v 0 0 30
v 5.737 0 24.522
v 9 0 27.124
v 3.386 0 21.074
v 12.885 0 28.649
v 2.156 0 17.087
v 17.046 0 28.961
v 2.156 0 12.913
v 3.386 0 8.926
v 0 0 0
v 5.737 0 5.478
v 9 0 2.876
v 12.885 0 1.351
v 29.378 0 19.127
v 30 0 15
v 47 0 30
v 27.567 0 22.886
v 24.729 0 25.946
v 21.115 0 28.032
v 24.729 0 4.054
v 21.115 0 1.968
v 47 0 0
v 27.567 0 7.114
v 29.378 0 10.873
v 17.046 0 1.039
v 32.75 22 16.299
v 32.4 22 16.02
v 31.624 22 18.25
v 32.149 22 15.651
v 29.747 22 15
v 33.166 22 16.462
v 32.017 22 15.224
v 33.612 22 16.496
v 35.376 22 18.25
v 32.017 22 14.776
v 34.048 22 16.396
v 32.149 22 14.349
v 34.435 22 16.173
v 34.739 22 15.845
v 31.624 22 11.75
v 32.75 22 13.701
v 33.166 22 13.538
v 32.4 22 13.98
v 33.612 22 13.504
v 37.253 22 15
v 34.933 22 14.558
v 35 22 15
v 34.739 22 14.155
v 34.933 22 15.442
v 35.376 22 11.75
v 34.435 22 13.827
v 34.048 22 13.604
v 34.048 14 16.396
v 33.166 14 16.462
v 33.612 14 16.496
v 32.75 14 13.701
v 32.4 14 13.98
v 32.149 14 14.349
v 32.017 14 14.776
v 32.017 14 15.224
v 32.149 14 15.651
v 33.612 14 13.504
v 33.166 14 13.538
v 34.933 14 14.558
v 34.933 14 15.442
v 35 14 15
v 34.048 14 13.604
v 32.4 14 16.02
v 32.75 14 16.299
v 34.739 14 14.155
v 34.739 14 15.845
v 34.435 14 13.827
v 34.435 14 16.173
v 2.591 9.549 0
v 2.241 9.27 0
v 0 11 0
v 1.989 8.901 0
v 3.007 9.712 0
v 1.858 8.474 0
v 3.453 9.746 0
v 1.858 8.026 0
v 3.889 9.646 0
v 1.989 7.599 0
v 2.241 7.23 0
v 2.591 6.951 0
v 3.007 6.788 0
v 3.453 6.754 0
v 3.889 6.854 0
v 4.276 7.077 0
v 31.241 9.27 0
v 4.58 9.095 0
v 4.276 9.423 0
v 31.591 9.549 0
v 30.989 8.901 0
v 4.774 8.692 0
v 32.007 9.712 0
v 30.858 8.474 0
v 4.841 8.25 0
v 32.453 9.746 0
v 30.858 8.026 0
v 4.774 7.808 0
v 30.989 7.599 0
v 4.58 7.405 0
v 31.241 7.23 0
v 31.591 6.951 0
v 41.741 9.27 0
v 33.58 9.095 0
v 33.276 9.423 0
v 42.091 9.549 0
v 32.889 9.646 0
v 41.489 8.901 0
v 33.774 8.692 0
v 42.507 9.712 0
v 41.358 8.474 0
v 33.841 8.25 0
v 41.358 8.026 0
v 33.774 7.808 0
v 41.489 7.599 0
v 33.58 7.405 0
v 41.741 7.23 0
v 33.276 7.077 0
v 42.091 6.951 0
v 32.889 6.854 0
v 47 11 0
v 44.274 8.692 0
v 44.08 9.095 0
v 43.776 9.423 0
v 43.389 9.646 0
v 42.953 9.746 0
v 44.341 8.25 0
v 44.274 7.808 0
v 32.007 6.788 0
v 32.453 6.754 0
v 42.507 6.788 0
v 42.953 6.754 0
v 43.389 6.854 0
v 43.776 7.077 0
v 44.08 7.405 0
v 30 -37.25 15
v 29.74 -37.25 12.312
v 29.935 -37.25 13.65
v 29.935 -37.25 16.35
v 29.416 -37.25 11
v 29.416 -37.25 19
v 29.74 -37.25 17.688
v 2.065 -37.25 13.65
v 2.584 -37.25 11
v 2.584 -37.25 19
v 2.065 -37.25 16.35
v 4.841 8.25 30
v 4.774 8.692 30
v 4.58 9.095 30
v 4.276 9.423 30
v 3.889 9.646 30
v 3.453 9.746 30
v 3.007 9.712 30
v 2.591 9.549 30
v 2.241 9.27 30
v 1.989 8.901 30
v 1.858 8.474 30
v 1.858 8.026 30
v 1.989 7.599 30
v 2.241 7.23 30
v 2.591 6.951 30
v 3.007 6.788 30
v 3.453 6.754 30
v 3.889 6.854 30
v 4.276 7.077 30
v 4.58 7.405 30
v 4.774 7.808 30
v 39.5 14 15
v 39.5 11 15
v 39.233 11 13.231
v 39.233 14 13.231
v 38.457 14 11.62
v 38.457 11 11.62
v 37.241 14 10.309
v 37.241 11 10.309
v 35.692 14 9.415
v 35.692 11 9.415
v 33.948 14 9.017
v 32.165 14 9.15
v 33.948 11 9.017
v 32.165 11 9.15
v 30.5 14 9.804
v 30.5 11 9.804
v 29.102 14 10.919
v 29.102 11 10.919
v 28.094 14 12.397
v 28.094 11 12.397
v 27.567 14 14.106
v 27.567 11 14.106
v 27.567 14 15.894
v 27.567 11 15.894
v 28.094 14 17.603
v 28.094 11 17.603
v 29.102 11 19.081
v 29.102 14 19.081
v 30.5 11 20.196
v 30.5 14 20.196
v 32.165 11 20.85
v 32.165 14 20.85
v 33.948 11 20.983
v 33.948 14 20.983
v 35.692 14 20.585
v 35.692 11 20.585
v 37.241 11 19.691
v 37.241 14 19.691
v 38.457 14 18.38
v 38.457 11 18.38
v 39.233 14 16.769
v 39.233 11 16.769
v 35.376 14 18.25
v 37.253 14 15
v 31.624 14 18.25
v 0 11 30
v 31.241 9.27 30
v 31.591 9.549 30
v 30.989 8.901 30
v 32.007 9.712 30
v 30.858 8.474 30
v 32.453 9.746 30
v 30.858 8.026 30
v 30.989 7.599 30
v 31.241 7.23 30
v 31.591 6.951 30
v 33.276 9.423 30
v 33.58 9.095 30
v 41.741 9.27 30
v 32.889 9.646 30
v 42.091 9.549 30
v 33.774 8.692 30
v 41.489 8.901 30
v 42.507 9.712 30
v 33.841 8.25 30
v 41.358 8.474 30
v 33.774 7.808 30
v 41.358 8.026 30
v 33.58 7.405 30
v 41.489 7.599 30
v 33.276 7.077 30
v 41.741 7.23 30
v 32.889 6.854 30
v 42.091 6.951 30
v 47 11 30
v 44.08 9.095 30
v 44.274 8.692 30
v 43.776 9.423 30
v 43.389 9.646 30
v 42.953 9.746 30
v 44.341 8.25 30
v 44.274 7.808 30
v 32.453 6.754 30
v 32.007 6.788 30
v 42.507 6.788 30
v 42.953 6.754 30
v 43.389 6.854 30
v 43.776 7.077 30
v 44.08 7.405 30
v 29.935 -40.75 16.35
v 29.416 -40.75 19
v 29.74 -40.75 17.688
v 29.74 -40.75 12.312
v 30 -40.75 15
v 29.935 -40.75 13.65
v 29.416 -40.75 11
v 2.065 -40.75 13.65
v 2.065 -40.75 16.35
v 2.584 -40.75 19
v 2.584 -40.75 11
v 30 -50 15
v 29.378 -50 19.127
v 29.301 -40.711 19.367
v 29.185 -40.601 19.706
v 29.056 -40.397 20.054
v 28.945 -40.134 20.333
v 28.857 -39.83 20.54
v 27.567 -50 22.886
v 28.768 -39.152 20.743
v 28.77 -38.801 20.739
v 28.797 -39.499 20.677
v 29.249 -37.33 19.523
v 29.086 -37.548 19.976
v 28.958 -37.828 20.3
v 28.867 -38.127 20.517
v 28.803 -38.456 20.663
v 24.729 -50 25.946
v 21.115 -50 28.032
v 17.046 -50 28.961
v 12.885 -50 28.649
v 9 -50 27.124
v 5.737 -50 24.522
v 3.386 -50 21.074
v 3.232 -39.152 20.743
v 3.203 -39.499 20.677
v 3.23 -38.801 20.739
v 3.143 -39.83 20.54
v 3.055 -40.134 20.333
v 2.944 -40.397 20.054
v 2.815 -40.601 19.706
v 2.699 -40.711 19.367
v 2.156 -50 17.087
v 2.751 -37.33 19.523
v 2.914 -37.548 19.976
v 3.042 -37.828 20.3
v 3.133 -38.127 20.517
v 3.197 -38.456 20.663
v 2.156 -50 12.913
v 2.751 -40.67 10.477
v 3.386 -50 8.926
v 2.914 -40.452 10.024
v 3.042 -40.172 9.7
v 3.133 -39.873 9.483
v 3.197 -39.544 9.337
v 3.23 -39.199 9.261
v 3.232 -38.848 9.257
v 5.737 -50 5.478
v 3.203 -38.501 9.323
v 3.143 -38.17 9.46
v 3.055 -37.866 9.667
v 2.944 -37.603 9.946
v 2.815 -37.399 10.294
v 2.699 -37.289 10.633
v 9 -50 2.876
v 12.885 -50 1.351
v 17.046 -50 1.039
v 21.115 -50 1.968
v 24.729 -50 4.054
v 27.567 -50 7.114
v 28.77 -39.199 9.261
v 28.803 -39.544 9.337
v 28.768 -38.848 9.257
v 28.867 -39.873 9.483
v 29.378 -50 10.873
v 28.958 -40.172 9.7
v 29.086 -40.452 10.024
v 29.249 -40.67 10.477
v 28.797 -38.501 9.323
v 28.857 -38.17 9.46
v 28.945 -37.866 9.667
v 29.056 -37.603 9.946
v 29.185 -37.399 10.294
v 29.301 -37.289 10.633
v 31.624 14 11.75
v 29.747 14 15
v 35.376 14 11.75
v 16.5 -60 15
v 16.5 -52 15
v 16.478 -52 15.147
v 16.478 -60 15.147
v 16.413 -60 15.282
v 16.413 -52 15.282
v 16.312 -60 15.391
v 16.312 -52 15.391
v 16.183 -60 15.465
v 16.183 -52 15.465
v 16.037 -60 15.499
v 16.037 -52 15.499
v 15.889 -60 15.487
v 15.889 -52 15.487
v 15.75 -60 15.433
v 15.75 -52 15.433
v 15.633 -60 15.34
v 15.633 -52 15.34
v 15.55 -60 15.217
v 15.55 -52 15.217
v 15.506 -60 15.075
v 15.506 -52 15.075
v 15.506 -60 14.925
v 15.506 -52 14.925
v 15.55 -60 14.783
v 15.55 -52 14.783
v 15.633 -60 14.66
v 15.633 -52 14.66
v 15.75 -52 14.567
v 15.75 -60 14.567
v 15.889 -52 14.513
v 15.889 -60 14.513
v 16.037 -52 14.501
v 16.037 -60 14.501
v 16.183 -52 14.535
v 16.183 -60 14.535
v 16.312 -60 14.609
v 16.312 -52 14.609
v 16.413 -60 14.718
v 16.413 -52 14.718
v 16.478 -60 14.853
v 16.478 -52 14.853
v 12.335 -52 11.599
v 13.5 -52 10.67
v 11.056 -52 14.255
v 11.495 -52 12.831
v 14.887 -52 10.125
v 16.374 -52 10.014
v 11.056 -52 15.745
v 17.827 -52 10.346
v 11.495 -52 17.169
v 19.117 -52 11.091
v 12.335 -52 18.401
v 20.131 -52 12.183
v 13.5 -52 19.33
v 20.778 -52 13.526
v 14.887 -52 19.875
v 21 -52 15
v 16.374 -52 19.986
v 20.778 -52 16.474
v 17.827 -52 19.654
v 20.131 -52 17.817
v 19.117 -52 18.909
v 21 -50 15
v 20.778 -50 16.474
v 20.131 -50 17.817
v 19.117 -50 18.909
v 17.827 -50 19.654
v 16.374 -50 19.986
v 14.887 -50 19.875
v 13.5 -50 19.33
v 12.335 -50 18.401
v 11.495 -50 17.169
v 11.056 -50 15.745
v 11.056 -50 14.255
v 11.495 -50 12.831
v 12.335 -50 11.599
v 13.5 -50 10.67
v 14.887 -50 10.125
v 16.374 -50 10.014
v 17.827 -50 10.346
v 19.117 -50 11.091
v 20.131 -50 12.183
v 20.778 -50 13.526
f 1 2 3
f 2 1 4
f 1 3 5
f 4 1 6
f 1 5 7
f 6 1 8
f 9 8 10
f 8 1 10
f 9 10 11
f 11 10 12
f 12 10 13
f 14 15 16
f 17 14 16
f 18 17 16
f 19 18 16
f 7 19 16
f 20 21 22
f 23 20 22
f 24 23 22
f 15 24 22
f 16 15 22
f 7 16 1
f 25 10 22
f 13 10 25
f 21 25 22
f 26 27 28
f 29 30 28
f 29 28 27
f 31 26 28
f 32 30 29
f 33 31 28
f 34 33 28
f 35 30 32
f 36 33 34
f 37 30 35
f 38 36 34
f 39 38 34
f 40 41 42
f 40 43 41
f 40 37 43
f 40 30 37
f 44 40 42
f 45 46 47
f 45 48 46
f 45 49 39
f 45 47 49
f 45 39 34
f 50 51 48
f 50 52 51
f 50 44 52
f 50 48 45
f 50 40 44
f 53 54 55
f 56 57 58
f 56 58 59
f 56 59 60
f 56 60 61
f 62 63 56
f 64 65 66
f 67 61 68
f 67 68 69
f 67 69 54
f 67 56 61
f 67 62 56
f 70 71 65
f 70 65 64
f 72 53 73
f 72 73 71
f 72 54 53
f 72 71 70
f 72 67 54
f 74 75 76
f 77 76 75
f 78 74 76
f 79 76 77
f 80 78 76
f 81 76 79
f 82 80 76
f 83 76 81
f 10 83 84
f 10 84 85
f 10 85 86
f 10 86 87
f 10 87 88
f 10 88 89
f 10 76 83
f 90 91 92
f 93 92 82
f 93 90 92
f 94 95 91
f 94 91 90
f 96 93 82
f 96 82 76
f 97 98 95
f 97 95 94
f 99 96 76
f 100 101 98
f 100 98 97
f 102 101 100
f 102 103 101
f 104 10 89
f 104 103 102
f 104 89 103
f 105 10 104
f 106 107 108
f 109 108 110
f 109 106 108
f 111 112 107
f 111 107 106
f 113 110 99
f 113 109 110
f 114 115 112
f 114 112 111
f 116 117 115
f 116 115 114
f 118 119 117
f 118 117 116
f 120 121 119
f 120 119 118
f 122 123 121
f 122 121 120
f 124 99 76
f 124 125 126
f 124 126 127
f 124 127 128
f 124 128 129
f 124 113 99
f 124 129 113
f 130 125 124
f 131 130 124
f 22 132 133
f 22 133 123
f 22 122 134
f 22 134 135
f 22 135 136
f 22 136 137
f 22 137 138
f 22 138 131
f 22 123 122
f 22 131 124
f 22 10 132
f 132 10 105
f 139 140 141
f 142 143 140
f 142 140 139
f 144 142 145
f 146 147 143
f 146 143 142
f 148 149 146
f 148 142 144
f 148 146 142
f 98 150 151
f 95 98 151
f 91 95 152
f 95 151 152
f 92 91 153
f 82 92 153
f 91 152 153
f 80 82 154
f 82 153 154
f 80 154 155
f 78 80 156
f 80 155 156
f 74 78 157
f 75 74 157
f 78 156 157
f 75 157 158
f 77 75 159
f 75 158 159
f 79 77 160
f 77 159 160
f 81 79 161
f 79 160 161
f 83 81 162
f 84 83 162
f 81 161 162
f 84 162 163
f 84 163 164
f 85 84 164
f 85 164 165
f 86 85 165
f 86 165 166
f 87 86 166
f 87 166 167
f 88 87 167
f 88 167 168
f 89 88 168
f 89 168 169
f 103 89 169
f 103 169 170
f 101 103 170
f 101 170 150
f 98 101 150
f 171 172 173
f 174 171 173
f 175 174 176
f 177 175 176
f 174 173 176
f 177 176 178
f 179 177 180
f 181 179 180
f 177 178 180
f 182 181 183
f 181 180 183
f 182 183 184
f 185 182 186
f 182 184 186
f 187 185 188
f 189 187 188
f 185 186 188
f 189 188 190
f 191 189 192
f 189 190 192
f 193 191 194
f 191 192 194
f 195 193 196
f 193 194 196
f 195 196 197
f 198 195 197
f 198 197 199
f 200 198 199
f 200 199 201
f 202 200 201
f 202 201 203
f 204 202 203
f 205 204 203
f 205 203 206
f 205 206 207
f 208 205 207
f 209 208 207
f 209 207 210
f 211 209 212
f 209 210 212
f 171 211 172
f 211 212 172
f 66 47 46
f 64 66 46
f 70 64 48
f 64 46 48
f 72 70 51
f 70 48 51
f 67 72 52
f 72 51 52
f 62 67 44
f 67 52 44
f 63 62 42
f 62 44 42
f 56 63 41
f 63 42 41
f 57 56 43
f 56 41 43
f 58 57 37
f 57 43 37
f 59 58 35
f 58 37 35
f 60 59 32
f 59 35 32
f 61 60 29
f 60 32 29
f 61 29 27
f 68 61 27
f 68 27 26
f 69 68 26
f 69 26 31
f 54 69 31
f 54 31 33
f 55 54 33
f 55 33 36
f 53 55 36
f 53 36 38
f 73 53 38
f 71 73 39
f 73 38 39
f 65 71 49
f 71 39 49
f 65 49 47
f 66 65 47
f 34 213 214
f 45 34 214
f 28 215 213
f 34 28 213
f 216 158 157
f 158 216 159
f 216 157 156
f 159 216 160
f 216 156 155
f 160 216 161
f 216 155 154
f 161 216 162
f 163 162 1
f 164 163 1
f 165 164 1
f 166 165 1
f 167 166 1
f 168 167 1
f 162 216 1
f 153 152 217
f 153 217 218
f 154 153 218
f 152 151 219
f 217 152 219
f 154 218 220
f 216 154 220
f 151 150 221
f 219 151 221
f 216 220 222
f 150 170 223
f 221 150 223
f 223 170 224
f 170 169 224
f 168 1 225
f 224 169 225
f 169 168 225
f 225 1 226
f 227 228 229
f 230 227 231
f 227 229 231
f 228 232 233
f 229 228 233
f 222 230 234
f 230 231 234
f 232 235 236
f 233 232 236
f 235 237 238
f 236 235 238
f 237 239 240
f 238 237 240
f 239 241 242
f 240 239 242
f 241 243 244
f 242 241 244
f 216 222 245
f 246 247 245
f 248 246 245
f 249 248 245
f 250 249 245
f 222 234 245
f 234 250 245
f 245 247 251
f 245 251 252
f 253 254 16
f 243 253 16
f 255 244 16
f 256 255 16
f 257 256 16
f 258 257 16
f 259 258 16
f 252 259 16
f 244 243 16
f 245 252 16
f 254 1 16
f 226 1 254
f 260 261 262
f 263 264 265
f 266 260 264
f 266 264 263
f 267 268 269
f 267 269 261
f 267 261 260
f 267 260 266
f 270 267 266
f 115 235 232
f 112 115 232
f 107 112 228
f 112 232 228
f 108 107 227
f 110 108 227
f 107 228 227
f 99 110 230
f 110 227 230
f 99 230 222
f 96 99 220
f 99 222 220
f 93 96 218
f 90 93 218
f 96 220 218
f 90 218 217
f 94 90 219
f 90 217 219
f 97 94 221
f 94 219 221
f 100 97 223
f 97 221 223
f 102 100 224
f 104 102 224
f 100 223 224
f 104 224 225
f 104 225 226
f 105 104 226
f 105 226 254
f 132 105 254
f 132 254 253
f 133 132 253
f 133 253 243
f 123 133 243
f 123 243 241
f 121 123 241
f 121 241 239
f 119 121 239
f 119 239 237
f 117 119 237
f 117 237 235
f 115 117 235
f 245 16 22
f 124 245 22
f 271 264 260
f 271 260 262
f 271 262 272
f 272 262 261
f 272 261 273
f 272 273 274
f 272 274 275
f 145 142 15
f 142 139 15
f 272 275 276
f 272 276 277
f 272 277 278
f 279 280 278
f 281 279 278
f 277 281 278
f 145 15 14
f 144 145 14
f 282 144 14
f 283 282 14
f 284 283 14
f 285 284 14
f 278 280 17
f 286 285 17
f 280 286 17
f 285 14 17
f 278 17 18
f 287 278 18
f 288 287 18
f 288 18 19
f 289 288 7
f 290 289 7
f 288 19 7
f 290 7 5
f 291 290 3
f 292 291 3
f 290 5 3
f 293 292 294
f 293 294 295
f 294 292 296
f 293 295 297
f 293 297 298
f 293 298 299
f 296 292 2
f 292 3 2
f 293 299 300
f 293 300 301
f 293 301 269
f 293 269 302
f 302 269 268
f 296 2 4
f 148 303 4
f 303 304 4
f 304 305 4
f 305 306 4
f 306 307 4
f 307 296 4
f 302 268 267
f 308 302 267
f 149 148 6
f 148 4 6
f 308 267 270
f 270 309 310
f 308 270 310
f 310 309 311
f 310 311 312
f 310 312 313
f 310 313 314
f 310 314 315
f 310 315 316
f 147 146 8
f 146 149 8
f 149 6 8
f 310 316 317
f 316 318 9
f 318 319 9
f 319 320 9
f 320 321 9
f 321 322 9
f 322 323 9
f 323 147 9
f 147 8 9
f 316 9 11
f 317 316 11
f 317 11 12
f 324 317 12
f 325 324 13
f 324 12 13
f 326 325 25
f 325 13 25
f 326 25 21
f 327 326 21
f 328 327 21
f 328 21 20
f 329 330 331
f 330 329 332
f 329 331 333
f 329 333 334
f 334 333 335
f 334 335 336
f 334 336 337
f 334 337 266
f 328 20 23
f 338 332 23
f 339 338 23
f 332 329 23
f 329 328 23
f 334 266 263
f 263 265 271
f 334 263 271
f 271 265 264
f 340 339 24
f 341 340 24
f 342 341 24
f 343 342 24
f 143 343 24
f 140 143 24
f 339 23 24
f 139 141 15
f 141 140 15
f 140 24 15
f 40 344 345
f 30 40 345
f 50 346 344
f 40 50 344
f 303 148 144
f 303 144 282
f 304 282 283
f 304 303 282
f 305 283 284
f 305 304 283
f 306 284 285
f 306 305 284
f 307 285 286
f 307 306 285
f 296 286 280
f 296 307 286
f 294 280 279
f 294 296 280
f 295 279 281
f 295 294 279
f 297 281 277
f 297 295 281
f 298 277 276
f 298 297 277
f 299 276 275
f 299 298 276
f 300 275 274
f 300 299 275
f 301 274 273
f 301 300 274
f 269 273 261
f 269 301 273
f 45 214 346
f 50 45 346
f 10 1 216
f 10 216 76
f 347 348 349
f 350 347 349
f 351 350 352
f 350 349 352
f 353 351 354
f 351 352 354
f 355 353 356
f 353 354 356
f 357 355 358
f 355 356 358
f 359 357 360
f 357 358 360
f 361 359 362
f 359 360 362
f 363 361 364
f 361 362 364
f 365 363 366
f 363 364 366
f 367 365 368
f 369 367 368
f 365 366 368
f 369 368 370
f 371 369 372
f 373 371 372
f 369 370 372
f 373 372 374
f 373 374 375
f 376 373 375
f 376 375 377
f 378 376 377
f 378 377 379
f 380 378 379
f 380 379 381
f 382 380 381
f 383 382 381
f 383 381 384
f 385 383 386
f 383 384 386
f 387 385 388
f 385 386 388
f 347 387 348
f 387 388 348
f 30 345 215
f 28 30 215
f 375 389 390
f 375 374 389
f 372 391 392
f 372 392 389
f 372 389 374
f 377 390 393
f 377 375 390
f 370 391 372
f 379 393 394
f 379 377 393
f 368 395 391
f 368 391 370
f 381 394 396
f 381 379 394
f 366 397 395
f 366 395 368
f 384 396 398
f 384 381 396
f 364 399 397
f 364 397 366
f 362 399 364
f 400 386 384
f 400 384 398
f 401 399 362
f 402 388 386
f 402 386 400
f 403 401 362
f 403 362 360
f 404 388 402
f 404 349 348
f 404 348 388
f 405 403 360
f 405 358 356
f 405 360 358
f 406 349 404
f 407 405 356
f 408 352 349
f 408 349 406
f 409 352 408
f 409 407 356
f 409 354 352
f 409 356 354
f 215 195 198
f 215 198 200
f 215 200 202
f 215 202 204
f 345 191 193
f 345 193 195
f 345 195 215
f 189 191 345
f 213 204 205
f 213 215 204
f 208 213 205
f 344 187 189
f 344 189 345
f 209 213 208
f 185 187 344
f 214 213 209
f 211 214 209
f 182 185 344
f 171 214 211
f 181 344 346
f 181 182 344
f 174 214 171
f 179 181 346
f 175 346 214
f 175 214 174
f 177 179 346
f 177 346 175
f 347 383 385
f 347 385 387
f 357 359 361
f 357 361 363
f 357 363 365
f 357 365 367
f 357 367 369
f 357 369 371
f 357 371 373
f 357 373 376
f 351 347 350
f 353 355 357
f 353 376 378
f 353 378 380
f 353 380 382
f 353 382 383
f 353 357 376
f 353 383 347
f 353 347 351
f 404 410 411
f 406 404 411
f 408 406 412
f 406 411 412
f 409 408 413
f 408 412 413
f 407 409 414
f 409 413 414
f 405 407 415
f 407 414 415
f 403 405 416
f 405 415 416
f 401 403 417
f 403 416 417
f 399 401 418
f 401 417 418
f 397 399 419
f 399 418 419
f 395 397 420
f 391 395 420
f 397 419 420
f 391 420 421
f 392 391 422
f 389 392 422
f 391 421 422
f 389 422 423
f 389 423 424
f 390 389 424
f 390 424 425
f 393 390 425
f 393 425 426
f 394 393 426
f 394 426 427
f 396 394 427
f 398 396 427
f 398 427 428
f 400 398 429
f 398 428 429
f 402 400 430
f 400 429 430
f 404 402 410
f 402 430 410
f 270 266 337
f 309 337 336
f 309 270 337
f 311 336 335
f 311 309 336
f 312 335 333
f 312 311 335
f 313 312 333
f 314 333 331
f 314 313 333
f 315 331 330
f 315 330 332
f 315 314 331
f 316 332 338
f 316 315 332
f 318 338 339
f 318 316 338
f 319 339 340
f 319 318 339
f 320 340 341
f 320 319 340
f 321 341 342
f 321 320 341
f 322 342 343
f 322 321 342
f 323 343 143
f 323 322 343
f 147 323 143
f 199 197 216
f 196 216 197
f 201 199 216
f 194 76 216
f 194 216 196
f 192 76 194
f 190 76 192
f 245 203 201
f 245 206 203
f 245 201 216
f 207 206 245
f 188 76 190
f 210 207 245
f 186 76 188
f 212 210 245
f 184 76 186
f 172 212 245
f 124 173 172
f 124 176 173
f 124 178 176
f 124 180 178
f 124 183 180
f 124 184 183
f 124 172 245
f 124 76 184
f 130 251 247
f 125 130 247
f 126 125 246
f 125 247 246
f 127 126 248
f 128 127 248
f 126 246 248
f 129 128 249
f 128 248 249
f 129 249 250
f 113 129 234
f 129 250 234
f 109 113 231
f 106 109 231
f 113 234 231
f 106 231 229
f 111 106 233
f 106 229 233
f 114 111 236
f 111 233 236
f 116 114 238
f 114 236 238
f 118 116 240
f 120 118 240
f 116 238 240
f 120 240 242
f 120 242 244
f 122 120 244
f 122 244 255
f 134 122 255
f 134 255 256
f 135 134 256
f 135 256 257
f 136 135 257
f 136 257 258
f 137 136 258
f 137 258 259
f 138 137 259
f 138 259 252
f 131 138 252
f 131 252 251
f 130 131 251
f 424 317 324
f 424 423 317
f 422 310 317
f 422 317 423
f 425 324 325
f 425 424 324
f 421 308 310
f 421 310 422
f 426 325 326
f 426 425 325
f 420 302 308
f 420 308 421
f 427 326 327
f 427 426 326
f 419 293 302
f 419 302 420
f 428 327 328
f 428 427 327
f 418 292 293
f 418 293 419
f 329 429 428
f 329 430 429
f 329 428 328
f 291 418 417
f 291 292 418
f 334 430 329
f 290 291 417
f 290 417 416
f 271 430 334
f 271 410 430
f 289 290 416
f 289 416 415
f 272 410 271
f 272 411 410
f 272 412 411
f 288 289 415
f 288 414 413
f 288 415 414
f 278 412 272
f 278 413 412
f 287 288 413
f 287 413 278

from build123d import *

# Parameters (mm, degrees)
SKETCH_1_W          = 47
SKETCH_1_H          = 30
EXTRUDE_1_DEPTH     = 11
SKETCH_2_R          = 6
EXTRUDE_2_DEPTH     = 3
EXTRUDE_3_DEPTH     = 8
SKETCH_4_R          = 14
EXTRUDE_4_DEPTH     = 50
SKETCH_5_R          = 5
EXTRUDE_5_DEPTH     = 2
SKETCH_6_R          = 1.5
CUT_EXTRUDE_1_DEPTH = 31
CUT_EXTRUDE_2_DEPTH = 48
SKETCH_9_R          = 1.5
CUT_EXTRUDE_3_DEPTH = 8
SKETCH_11_R         = 0.5
EXTRUDE_6_DEPTH     = 8


with BuildPart() as part:
    # 草图1 → 凸台-拉伸1 (new body)
    with BuildSketch(Plane(origin=(0, 0, 0), x_dir=(1, 0, 0), z_dir=(0, 1, 0))):
        with Locations((23.5, -15)):
            Rectangle(SKETCH_1_W, SKETCH_1_H)
    extrude(amount=EXTRUDE_1_DEPTH)

    # 草图2 → 凸台-拉伸2 (add)
    with BuildSketch(Plane(origin=(0, 11, 0), x_dir=(1, 0, 0), z_dir=(0, 1, 0))):
        with Locations((33.5, -15)):
            Circle(SKETCH_2_R)
    extrude(amount=EXTRUDE_2_DEPTH)

    # 草图3 → 凸台-拉伸3 (add)
    with BuildSketch(Plane(origin=(0, 14, 0), x_dir=(1, 0, 0), z_dir=(0, 1, 0))):
        Polygon((37.25277675, -15), (35.376388375, -11.75), (31.623611625, -11.75), (29.74722325, -15), (31.623611625, -18.25), (35.376388375, -18.25), align=None)
    extrude(amount=EXTRUDE_3_DEPTH)

    # 草图4 → 凸台-拉伸4 (add)
    with BuildSketch(Plane.XZ):
        with Locations((16, 15)):
            Circle(SKETCH_4_R)
    extrude(amount=EXTRUDE_4_DEPTH)

    # 草图5 → 凸台-拉伸5 (add)
    with BuildSketch(Plane.XZ.offset(50)):
        with Locations((16, 15)):
            Circle(SKETCH_5_R)
    extrude(amount=EXTRUDE_5_DEPTH)

    # 草图6 → 切除-拉伸1 (cut, through all)
    with BuildSketch(Plane.XY.offset(30)):
        with Locations((3.340757383, 8.25)):
            Circle(SKETCH_6_R)
        with Locations((32.340757383, 8.25)):
            Circle(SKETCH_6_R)
        with Locations((42.840757383, 8.25)):
            Circle(SKETCH_6_R)
    extrude(amount=-CUT_EXTRUDE_1_DEPTH, mode=Mode.SUBTRACT)

    # 草图7 → 切除-拉伸2 (cut, through all)
    with BuildSketch(Plane.ZY):
        with BuildLine():
            Line((11, -37.25), (19, -37.25))
            ThreePointArc((19, -37.25), (20.75, -39), (19, -40.75))
            Line((19, -40.75), (11, -40.75))
            ThreePointArc((11, -40.75), (9.25, -39), (11, -37.25))
        make_face()
    extrude(amount=-CUT_EXTRUDE_2_DEPTH, mode=Mode.SUBTRACT)

    # 草图9 → 切除-拉伸3 (cut)
    with BuildSketch(Plane(origin=(0, 22, 0), x_dir=(1, 0, 0), z_dir=(0, 1, 0))):
        with Locations((33.5, -15)):
            Circle(SKETCH_9_R)
    extrude(amount=-CUT_EXTRUDE_3_DEPTH, mode=Mode.SUBTRACT)

    # 草图11 → 凸台-拉伸6 (add)
    with BuildSketch(Plane.XZ.offset(52)):
        with Locations((16, 15)):
            Circle(SKETCH_11_R)
    extrude(amount=EXTRUDE_6_DEPTH)


solid = part.part
